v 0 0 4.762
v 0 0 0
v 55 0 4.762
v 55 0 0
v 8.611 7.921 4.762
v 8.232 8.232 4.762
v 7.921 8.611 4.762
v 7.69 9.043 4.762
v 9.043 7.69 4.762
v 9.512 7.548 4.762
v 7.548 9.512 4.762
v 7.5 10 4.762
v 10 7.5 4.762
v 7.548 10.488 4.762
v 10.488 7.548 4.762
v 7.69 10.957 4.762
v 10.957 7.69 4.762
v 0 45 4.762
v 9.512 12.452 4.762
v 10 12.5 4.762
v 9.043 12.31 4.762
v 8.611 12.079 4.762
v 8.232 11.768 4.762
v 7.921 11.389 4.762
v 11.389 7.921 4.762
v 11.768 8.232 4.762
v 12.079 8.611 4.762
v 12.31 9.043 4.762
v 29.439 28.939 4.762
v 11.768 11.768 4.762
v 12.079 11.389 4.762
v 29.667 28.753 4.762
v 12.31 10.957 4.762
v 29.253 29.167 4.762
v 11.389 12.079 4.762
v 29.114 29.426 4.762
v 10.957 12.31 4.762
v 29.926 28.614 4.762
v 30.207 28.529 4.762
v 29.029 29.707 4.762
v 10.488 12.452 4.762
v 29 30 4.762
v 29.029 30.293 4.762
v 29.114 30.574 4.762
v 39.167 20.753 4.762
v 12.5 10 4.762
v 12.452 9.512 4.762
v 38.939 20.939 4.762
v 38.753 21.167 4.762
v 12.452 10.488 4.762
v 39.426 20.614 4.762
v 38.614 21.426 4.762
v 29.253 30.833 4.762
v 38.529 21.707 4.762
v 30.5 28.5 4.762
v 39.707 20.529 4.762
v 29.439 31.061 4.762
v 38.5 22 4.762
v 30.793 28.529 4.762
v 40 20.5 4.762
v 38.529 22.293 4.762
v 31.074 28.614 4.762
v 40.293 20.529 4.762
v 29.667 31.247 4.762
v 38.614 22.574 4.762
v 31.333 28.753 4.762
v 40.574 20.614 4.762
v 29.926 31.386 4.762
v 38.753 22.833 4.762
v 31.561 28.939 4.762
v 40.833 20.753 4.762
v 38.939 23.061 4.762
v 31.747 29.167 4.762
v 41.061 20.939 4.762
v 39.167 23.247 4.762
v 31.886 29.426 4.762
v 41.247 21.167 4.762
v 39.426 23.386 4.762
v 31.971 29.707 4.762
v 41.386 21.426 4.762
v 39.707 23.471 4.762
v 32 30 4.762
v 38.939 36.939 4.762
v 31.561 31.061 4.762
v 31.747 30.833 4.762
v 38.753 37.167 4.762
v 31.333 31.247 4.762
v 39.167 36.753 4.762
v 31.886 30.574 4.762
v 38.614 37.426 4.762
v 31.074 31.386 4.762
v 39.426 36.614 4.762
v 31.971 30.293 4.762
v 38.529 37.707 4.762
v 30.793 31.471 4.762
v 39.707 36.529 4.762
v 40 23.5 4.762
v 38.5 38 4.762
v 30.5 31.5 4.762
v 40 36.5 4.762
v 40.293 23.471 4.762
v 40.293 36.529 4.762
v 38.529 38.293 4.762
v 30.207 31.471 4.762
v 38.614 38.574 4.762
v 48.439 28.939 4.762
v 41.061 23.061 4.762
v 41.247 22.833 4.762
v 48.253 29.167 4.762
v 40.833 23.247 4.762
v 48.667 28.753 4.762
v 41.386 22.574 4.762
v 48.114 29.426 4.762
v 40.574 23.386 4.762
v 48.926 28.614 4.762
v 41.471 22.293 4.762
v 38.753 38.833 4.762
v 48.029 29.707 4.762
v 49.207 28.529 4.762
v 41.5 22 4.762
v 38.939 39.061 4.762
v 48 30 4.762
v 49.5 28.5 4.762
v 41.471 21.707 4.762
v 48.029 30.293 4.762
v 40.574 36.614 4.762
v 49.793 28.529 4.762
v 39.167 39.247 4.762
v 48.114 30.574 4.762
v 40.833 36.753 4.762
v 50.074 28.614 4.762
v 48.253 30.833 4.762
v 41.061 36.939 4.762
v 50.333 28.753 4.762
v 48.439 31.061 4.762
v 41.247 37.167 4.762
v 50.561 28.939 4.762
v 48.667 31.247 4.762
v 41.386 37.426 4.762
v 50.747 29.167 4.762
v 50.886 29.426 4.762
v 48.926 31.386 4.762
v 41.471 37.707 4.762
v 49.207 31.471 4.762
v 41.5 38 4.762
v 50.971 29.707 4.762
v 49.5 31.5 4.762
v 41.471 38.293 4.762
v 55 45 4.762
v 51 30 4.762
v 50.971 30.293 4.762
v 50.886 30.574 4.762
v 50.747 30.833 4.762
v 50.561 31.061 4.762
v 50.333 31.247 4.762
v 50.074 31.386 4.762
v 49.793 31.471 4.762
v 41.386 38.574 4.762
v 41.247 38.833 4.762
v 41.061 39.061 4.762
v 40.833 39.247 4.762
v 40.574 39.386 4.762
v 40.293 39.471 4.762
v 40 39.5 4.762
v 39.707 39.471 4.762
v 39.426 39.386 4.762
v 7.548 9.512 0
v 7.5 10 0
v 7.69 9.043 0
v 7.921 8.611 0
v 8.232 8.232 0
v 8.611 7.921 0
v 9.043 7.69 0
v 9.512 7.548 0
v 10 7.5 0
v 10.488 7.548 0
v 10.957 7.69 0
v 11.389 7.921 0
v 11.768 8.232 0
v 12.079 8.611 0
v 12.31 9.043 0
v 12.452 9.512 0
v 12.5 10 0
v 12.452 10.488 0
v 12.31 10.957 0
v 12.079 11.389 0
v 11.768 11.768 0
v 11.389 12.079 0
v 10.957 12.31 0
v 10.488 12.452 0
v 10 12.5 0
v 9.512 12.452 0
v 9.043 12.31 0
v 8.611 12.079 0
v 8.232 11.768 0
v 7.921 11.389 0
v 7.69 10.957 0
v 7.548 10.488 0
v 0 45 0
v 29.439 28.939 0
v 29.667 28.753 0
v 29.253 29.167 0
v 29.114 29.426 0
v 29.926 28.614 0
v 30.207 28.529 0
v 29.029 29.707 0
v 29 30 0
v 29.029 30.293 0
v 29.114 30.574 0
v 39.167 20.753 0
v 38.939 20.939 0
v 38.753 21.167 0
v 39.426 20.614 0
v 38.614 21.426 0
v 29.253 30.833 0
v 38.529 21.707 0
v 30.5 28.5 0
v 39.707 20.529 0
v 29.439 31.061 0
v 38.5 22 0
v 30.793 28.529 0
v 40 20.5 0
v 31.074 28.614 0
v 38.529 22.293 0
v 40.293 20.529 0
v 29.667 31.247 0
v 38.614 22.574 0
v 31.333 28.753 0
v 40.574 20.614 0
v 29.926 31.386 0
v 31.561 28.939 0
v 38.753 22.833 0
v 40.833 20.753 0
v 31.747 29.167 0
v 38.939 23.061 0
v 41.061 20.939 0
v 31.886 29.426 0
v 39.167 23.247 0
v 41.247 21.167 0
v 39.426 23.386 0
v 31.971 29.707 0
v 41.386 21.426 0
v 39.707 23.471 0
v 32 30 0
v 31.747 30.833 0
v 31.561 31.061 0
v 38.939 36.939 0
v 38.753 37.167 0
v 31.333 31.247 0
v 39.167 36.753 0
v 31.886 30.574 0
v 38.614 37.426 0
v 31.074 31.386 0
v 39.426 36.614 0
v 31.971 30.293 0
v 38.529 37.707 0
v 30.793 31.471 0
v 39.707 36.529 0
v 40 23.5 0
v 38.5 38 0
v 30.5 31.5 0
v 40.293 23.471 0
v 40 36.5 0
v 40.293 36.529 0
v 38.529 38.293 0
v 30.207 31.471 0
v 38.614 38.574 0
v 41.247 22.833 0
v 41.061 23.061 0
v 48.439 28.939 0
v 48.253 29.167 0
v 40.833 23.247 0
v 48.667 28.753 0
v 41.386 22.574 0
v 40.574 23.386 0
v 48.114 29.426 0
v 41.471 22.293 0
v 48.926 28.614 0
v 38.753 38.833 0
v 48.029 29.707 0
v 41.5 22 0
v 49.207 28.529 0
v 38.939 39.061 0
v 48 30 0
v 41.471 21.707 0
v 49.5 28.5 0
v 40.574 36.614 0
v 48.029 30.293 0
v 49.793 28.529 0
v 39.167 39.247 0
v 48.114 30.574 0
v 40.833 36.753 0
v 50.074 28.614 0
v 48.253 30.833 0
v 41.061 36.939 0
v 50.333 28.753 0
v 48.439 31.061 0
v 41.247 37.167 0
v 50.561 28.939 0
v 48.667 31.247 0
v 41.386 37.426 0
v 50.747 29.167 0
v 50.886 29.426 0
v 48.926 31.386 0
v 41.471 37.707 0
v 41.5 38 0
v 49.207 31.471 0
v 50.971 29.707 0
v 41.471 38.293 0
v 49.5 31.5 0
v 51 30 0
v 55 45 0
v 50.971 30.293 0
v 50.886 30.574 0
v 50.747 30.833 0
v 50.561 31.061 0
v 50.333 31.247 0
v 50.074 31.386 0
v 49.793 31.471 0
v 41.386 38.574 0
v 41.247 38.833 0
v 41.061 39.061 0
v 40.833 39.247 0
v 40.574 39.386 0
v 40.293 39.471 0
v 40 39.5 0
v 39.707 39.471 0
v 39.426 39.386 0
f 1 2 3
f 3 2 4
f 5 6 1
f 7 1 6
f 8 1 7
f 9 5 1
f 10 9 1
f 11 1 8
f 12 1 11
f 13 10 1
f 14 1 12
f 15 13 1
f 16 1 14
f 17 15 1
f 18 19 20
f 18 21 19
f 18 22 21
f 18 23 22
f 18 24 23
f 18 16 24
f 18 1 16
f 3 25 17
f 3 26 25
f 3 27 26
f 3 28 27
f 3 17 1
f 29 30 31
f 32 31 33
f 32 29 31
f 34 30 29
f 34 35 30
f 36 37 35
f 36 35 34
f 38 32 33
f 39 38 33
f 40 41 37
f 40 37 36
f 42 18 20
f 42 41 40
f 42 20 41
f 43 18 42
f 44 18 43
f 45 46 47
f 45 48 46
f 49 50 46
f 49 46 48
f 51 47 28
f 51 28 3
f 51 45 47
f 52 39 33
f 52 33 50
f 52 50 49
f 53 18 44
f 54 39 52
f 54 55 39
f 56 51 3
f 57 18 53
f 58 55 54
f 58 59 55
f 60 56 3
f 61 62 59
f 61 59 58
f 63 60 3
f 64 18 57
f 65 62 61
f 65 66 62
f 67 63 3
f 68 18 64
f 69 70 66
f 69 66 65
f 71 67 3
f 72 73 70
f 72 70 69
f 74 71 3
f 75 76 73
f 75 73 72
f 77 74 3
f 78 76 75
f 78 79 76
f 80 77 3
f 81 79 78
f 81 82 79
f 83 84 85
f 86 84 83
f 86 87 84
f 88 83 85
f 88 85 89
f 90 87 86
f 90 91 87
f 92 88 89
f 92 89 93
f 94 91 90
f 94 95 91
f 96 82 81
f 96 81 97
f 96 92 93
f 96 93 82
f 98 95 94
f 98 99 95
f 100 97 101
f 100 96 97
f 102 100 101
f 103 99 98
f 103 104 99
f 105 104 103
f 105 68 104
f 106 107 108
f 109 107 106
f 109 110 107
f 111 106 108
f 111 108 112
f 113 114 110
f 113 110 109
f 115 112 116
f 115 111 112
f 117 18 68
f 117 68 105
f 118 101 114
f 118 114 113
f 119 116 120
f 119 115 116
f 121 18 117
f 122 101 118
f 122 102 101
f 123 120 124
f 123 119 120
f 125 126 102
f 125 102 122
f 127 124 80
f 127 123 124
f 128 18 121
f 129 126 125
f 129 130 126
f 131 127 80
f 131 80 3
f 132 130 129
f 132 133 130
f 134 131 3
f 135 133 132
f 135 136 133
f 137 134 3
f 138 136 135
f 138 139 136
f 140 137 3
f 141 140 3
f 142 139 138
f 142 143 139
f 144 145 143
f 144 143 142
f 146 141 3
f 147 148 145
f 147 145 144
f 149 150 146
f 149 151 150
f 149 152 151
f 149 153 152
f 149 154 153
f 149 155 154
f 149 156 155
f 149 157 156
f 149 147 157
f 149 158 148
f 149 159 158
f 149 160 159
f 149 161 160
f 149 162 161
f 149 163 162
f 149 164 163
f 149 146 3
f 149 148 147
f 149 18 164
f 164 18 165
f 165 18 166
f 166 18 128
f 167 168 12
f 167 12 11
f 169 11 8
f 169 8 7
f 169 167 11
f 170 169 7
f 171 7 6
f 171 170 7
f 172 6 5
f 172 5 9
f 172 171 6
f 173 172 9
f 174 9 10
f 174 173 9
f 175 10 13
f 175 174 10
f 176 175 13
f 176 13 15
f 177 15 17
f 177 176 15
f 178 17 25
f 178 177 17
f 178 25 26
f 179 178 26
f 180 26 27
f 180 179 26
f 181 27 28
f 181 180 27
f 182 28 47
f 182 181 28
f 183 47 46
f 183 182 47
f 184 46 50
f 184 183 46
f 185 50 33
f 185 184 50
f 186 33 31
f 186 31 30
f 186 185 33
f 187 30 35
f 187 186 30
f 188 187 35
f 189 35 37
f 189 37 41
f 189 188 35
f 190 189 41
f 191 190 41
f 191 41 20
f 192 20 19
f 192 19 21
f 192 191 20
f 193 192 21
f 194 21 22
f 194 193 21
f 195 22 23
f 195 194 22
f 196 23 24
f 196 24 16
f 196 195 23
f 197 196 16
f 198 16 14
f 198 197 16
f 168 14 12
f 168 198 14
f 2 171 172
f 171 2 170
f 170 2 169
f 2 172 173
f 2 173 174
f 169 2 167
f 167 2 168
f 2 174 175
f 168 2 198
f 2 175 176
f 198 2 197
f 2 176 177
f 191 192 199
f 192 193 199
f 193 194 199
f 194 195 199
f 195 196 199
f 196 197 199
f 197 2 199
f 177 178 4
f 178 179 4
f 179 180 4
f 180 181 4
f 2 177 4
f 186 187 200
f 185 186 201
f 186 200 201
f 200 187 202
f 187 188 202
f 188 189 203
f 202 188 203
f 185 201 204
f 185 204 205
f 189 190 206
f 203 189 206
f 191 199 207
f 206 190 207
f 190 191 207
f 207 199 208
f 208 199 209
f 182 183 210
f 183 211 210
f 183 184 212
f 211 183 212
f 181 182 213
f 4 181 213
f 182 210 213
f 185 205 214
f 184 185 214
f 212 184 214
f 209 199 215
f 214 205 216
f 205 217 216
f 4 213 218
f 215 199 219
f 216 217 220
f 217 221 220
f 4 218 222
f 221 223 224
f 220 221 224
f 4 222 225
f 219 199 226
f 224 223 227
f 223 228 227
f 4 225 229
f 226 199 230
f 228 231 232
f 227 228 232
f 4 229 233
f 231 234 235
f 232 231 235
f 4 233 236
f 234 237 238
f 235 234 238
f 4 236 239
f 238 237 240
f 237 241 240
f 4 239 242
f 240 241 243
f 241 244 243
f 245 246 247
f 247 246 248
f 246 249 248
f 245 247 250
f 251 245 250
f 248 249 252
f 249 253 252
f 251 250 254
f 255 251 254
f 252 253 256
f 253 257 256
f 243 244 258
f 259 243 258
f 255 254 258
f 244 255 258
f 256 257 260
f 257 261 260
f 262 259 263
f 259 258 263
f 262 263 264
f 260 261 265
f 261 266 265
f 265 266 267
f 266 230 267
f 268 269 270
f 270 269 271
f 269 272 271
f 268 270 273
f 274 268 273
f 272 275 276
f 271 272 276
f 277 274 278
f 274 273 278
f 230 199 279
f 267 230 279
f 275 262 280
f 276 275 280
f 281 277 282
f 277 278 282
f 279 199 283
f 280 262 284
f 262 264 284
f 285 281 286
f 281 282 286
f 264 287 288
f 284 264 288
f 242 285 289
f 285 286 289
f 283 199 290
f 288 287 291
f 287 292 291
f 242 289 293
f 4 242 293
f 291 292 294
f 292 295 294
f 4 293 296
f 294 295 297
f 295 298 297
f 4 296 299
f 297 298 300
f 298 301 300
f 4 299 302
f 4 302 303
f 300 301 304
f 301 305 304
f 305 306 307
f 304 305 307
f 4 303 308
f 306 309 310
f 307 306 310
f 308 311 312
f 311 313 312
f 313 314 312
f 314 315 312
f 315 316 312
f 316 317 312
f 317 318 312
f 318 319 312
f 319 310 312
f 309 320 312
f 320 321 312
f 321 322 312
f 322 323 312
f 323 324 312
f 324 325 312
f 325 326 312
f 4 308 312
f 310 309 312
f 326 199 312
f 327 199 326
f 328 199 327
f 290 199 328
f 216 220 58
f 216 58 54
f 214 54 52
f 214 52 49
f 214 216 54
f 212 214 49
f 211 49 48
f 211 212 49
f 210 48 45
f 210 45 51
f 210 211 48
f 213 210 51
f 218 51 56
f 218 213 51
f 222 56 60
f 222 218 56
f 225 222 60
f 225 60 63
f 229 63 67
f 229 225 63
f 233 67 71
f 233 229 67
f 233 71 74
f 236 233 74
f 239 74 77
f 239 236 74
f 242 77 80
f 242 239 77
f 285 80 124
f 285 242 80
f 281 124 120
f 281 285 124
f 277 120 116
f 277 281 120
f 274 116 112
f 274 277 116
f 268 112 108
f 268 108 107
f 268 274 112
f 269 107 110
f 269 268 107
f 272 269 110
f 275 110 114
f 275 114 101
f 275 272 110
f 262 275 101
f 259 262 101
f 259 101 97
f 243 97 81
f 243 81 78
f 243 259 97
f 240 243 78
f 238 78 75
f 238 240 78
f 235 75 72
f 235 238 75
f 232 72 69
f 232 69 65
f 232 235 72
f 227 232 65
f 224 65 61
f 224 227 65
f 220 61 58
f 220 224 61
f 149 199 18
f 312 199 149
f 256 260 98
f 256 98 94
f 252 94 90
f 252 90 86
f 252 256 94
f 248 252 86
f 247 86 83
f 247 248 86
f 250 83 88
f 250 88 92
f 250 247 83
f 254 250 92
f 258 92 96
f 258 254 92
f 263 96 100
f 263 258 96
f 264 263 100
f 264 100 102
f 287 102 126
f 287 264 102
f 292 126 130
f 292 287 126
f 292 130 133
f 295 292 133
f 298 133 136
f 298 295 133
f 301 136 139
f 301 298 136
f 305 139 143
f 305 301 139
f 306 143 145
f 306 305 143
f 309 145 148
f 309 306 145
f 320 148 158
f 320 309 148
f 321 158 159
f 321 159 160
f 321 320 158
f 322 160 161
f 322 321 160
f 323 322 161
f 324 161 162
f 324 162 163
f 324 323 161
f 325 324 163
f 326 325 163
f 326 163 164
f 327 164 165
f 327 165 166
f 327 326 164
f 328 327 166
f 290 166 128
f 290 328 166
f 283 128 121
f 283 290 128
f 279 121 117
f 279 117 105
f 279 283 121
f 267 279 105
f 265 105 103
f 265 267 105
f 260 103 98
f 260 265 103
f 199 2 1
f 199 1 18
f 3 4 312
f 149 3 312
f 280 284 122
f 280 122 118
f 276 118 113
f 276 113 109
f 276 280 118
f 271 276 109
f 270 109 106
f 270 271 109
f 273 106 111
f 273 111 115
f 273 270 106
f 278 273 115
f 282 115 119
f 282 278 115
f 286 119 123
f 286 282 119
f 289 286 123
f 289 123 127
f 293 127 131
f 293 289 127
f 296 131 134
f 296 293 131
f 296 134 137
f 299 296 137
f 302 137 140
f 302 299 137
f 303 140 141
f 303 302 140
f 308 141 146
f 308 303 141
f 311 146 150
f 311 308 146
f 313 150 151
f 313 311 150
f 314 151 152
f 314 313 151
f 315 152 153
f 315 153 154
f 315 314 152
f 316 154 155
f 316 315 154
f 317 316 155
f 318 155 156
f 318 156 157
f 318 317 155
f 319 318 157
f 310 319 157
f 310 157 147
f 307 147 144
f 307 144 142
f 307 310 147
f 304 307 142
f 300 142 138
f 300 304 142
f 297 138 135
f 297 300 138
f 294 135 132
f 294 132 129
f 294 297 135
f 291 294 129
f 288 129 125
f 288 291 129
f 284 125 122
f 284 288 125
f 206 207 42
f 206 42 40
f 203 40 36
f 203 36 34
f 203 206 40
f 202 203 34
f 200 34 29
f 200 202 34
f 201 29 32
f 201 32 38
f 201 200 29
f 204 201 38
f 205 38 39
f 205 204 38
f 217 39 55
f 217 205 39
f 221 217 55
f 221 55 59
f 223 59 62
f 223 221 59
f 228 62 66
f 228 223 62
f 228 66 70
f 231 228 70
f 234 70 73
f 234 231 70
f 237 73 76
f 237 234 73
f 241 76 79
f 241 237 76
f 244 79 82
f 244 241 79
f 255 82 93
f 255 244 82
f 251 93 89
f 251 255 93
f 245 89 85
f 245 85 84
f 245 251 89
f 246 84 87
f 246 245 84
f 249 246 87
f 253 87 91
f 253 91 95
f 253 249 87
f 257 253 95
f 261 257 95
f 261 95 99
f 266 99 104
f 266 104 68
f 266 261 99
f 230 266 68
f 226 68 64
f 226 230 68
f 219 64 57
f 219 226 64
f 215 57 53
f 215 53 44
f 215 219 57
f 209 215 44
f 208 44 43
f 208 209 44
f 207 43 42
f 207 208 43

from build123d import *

# Parameters (mm, degrees)
SKETCH1_W           = 55
SKETCH1_H           = 45
SKETCH1_R           = 2.5
SKETCH1_R_2         = 1.5
BOSS_EXTRUDE1_DEPTH = 4.7625


with BuildPart() as part:
    # Sketch1 → Boss-Extrude1 (new body)
    with BuildSketch(Plane.XY):
        with Locations((27.5, 22.5)):
            Rectangle(SKETCH1_W, SKETCH1_H)
        with Locations(Location((10, 10, 0), (0, 0, 180))):
            Circle(SKETCH1_R, mode=Mode.SUBTRACT)
        with Locations(Location((30.5, 30, 0), (0, 0, 180))):
            Circle(SKETCH1_R_2, mode=Mode.SUBTRACT)
        with Locations(Location((49.5, 30, 0), (0, 0, 180))):
            Circle(SKETCH1_R_2, mode=Mode.SUBTRACT)
        with Locations(Location((40, 38, 0), (0, 0, 180))):
            Circle(SKETCH1_R_2, mode=Mode.SUBTRACT)
        with Locations(Location((40, 22, 0), (0, 0, 180))):
            Circle(SKETCH1_R_2, mode=Mode.SUBTRACT)
    extrude(amount=BOSS_EXTRUDE1_DEPTH)


solid = part.part
